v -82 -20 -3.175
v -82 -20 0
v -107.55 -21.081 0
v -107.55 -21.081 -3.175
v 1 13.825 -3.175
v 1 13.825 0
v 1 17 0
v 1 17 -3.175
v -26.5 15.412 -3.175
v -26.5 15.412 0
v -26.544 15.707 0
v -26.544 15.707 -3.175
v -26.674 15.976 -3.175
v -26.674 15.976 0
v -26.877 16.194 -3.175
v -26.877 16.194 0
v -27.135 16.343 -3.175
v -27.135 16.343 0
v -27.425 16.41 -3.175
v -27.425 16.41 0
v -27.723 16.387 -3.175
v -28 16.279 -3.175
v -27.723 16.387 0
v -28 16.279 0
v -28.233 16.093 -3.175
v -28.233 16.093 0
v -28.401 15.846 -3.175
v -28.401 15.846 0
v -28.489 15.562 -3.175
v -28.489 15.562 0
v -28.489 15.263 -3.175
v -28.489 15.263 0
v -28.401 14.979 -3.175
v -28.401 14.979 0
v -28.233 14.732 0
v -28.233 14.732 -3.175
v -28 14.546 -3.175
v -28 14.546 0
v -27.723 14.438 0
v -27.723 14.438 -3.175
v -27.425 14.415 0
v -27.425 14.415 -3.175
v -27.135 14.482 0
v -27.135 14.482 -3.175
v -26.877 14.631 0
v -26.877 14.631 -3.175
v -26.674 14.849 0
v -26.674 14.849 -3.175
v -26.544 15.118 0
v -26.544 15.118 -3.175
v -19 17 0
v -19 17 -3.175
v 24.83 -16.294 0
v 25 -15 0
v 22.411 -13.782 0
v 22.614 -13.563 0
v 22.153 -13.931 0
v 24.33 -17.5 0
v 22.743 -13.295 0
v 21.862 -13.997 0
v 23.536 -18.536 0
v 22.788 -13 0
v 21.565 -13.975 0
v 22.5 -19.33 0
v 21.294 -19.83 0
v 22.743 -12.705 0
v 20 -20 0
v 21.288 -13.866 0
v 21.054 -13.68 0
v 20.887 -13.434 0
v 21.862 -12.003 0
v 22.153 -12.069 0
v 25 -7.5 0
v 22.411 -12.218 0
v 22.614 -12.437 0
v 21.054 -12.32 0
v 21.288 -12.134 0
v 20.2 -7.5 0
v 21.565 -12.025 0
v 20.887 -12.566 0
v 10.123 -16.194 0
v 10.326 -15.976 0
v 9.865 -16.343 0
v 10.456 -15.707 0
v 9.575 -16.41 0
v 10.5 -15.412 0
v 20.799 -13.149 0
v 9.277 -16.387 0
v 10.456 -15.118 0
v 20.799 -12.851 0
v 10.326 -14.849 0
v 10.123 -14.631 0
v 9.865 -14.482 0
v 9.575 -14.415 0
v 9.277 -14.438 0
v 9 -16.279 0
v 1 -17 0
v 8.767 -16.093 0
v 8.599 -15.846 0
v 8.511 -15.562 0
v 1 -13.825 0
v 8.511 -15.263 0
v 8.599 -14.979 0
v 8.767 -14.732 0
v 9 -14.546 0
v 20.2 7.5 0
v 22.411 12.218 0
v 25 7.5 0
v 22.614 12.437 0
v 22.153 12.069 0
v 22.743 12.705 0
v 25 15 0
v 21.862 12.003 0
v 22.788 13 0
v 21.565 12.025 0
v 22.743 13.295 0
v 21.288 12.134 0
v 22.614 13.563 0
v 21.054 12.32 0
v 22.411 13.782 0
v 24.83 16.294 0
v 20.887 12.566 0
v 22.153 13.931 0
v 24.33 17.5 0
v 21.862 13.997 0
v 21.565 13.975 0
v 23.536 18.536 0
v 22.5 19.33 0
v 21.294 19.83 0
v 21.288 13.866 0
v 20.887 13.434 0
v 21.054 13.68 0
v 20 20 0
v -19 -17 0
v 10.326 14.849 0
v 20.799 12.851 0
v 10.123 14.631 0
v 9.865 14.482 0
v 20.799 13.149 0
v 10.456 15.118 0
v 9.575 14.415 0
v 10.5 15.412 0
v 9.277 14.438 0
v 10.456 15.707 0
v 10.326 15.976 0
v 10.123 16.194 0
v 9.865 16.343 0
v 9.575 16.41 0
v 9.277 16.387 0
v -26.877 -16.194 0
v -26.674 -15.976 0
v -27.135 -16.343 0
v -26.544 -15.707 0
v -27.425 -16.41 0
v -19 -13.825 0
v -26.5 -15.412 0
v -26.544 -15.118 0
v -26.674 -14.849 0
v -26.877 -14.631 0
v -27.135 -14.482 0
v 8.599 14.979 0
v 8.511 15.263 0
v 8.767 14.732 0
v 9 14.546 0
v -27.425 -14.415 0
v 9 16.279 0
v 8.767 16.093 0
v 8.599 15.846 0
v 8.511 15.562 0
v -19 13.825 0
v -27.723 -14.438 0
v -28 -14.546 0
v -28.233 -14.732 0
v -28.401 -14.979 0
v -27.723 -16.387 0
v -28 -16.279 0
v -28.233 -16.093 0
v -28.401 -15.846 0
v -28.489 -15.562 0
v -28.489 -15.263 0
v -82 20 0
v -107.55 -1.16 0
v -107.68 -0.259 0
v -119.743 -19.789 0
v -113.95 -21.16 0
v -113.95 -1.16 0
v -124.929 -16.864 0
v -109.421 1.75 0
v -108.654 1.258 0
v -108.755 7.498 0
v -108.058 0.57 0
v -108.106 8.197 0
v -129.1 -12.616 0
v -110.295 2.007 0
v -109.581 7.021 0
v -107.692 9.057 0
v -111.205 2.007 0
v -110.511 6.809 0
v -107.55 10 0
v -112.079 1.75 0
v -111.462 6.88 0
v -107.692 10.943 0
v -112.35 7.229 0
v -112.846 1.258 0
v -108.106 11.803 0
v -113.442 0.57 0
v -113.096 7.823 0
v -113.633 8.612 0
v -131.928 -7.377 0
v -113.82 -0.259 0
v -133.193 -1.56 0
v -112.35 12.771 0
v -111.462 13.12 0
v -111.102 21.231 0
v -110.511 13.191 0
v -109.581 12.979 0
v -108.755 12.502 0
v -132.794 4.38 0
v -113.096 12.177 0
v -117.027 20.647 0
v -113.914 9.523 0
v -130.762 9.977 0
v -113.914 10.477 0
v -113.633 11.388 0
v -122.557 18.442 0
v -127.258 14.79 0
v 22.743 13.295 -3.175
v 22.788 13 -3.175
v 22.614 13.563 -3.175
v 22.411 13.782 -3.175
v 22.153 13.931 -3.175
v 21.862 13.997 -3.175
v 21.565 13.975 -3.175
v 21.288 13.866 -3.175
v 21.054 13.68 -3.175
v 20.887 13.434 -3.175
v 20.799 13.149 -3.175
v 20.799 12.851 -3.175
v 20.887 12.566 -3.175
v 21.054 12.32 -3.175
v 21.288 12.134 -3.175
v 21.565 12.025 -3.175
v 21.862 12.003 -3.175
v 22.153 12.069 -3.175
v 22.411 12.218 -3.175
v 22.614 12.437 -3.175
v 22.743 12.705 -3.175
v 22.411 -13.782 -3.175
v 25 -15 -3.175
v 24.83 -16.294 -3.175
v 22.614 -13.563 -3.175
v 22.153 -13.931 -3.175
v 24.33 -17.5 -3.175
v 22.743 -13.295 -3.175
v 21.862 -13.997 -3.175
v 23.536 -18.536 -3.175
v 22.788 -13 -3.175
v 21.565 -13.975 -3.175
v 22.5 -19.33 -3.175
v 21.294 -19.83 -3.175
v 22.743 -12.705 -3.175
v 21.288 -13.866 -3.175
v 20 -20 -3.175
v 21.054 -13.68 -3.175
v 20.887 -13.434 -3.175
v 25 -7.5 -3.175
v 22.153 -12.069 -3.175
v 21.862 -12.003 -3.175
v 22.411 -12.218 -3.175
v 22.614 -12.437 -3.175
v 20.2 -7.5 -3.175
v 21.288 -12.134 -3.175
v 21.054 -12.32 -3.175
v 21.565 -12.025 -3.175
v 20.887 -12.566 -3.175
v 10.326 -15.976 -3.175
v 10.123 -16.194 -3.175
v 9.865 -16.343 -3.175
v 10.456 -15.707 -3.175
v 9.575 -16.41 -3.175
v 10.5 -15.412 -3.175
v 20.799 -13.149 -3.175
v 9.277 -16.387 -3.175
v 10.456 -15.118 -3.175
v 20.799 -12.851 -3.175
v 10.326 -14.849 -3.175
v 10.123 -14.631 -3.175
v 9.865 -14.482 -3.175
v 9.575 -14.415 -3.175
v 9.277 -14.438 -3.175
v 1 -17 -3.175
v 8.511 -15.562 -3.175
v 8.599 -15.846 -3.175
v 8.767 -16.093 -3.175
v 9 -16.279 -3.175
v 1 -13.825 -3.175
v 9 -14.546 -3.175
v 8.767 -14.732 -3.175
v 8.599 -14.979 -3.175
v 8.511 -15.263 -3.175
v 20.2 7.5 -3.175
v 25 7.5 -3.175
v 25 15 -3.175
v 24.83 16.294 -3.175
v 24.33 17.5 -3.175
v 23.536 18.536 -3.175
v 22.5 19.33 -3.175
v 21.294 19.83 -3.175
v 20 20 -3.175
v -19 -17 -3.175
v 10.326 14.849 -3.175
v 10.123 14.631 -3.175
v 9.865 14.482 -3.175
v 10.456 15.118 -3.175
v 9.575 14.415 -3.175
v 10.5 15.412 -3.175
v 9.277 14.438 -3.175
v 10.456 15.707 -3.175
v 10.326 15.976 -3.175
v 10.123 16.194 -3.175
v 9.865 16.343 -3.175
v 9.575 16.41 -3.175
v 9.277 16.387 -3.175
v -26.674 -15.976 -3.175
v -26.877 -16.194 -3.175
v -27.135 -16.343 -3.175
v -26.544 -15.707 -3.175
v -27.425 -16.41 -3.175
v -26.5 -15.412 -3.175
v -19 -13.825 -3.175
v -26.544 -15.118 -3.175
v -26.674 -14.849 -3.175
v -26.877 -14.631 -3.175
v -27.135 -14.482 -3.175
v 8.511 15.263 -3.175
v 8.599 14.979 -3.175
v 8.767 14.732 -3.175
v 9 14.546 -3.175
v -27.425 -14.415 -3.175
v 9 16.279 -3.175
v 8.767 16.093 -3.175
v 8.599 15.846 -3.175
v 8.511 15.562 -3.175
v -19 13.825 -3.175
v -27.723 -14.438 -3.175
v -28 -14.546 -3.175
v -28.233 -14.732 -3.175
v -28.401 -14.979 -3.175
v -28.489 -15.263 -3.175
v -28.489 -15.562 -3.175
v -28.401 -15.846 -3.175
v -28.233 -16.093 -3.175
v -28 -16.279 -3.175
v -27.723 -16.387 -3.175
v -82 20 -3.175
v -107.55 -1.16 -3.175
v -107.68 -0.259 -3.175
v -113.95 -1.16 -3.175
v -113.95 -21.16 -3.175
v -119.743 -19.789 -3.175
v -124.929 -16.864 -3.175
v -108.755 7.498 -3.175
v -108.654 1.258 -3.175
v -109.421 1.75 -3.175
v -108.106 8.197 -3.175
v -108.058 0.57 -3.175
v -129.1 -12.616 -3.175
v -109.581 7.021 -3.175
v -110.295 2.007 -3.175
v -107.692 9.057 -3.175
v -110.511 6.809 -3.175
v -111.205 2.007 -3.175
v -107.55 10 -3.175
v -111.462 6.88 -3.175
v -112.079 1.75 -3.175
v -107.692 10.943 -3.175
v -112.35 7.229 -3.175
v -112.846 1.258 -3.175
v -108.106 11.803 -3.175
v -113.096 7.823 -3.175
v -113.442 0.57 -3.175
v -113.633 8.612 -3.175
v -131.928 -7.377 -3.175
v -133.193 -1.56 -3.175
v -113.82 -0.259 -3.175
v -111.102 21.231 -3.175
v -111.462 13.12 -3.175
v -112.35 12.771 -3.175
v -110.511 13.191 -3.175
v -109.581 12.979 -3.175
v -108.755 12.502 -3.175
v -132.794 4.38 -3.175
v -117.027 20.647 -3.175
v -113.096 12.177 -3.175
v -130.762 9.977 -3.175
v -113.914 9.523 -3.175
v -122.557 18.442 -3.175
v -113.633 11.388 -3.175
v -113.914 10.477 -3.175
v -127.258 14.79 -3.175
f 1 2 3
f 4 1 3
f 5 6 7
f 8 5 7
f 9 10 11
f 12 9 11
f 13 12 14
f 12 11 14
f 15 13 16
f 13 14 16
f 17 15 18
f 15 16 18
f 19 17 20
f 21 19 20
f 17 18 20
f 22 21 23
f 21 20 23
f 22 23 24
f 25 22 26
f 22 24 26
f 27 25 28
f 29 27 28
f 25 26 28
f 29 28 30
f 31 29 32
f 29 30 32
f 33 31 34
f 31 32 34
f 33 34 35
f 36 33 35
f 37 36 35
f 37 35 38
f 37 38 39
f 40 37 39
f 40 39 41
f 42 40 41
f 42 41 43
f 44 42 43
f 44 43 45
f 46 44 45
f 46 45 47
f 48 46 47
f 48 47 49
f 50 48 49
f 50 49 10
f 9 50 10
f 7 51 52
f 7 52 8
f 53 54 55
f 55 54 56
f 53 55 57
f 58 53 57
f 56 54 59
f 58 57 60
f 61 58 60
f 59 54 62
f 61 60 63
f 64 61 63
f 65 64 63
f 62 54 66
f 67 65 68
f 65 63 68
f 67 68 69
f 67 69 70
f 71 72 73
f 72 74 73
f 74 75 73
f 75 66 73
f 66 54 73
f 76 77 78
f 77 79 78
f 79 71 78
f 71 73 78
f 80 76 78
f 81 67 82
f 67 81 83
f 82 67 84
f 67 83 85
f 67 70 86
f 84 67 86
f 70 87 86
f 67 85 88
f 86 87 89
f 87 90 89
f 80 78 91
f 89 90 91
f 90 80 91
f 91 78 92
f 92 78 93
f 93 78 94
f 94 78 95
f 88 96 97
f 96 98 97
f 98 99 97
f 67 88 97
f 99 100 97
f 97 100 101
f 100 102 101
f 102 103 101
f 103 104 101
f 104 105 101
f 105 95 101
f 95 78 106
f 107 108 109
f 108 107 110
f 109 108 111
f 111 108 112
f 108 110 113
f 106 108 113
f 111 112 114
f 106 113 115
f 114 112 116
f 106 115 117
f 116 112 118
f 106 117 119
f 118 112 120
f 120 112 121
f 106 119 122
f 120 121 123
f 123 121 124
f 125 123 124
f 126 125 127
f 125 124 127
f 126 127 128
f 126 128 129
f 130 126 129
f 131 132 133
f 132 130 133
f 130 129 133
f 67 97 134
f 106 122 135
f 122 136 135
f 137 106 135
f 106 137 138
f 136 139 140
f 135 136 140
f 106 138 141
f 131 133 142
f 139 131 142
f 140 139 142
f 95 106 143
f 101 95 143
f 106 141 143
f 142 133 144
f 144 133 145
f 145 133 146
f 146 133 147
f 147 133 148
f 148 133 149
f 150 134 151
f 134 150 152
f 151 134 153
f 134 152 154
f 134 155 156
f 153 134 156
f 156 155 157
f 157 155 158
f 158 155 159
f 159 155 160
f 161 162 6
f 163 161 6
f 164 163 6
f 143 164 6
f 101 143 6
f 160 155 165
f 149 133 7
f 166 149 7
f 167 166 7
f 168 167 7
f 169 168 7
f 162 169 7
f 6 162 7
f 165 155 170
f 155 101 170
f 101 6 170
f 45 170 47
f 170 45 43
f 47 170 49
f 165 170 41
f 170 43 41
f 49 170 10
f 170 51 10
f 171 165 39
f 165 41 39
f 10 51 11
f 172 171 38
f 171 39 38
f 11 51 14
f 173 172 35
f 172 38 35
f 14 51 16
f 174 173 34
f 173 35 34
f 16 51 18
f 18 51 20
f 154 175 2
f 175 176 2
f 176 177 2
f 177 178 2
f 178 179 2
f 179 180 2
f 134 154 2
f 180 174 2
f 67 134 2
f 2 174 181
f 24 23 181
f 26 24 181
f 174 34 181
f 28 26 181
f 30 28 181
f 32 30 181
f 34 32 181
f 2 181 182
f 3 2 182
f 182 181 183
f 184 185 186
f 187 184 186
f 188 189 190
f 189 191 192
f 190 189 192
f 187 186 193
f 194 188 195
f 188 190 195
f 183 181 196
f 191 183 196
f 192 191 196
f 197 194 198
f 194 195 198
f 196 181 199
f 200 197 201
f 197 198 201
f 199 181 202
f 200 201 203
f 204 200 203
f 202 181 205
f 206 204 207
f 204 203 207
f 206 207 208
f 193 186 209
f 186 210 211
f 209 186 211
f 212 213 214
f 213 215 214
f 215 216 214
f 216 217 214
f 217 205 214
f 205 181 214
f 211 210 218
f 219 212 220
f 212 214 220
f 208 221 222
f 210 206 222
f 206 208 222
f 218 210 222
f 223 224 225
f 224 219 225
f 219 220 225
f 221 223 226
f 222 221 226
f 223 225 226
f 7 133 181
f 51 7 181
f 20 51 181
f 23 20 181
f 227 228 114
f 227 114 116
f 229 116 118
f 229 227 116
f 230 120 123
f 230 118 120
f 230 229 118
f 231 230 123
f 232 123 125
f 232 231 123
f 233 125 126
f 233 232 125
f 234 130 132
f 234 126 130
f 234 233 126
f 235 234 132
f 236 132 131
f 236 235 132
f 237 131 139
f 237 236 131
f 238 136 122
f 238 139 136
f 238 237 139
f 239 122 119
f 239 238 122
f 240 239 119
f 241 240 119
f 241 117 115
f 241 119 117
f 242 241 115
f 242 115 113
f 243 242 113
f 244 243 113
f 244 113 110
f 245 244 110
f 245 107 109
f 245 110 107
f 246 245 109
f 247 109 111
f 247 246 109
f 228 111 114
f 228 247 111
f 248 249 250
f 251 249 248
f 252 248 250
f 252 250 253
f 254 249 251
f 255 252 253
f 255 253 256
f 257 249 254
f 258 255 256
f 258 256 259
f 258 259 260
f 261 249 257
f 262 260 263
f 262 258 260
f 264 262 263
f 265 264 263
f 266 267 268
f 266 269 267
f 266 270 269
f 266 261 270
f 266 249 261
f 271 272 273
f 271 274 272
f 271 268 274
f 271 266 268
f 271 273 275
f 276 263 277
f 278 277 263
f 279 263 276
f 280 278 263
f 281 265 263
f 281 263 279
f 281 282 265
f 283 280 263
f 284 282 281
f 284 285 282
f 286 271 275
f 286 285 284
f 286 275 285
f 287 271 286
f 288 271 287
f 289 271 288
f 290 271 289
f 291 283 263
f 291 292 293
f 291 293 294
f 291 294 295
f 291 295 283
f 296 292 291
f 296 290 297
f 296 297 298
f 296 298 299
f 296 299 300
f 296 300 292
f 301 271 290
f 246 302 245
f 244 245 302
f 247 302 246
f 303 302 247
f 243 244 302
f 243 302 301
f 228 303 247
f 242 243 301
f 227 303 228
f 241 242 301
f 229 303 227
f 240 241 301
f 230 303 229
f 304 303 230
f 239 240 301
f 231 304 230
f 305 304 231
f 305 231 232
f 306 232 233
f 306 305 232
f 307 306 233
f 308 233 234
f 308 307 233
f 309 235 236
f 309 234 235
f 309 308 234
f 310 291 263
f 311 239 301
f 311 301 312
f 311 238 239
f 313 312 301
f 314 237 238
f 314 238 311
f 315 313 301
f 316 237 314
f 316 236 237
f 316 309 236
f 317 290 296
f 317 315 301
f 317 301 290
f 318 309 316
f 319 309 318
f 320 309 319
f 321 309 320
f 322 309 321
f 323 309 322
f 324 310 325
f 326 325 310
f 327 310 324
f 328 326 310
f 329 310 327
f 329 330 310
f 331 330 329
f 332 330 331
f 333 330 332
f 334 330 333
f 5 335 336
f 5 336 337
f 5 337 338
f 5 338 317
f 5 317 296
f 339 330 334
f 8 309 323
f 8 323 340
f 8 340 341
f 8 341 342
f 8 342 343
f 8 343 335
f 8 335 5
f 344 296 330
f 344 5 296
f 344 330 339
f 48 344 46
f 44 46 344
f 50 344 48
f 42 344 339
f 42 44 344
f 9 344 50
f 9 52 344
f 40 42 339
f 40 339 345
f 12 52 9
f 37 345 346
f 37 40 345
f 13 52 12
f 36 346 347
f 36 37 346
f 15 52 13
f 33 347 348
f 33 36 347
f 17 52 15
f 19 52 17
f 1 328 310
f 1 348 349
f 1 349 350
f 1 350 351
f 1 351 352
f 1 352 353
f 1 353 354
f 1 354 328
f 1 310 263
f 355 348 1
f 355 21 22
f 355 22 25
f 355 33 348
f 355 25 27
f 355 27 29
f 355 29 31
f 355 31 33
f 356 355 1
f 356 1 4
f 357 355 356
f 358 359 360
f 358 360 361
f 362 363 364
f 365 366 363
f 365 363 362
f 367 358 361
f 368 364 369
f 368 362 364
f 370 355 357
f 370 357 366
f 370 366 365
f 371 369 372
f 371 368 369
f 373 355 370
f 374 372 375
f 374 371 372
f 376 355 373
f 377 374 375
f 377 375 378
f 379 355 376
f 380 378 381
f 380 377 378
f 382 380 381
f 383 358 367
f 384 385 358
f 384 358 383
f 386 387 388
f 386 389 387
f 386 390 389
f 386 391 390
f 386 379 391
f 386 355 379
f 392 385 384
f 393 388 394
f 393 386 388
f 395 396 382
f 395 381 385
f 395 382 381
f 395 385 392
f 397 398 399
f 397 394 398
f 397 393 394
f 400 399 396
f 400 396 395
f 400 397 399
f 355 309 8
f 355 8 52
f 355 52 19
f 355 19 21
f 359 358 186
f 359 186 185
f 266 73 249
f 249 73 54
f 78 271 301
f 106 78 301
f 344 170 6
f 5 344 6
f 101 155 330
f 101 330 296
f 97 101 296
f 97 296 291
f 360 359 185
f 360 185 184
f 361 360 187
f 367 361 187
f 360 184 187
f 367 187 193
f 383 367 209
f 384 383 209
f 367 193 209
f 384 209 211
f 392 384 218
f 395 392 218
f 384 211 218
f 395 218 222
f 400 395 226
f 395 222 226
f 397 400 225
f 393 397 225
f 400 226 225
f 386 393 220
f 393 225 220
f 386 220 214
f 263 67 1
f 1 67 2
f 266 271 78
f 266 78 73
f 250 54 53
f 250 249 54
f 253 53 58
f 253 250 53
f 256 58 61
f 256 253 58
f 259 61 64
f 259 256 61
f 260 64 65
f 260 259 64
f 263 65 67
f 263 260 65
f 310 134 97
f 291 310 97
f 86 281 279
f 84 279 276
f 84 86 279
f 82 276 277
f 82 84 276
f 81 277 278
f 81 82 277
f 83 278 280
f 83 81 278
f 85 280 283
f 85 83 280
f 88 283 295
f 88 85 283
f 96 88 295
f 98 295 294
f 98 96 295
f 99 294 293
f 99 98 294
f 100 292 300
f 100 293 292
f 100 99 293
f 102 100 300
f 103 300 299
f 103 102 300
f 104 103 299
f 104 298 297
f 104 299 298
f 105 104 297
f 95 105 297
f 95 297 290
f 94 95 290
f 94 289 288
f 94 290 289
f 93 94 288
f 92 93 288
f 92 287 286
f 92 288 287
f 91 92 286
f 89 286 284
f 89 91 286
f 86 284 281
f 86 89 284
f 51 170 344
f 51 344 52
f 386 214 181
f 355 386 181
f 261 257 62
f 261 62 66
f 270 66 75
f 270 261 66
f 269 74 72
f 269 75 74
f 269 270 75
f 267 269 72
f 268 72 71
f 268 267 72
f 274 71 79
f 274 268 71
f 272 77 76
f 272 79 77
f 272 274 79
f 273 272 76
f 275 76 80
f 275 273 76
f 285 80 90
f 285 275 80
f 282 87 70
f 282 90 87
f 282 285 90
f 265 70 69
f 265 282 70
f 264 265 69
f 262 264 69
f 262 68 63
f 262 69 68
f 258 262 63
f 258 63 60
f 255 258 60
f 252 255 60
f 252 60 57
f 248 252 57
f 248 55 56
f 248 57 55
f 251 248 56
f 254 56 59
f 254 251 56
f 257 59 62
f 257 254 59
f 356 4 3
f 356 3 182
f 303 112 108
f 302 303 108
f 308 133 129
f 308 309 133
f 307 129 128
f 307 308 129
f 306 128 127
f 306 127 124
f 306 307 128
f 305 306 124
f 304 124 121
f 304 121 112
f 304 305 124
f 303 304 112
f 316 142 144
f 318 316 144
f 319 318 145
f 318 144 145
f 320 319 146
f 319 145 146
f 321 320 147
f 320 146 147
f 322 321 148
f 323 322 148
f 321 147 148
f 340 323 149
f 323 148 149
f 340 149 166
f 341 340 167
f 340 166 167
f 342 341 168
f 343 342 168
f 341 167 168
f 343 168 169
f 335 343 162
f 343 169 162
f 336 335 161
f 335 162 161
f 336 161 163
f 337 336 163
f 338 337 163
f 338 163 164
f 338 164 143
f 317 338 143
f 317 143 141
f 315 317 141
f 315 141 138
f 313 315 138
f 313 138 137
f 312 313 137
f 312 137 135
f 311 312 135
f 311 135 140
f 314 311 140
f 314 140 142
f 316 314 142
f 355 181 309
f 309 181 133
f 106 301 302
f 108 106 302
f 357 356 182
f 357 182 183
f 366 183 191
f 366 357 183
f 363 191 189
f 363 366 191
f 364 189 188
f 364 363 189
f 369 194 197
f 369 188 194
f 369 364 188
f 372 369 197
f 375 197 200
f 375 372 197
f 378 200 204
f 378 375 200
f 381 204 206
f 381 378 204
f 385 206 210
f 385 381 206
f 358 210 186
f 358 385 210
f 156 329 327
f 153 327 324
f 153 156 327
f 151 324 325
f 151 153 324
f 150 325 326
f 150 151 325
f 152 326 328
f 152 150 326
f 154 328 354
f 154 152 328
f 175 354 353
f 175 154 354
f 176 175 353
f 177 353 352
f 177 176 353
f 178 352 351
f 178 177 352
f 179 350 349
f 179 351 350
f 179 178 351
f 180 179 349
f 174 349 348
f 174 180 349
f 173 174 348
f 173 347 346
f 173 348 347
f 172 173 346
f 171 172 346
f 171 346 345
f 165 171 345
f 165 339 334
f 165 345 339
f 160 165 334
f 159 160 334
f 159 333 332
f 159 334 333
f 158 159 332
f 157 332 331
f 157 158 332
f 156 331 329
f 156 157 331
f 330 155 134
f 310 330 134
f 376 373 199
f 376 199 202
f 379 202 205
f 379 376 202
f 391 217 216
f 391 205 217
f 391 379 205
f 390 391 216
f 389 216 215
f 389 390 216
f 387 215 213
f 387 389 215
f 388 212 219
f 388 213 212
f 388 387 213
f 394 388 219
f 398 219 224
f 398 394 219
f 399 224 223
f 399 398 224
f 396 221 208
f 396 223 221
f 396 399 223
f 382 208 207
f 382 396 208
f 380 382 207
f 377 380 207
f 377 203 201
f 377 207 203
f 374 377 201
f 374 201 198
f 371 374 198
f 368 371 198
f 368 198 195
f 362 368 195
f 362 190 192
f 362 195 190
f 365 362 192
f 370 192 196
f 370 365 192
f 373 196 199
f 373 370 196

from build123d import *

# Parameters (mm, degrees)
BOSS_EXTRUDE1_DEPTH     = 3.175
CUT_EXTRUDE1_DEPTH      = 135.971128857
CUT_EXTRUDE1_DEPTH_BACK = 135.971128857
SKETCH3_R               = 3.2
SKETCH6_R               = 1
SKETCH6_W               = 20
SKETCH6_H               = 3.175
CUT_EXTRUDE4_DEPTH      = 135.971128857
CUT_EXTRUDE5_DEPTH      = 135.971128857
CUT_EXTRUDE5_DEPTH_BACK = 135.971128857
SKETCH7_R               = 1
SKETCH7_W               = 4.8
SKETCH7_H               = 15
FILLET2_R               = 5
FILLET3_R               = 5
CUT_EXTRUDE6_DEPTH      = 135.971128857
CUT_EXTRUDE6_DEPTH_BACK = 135.971128857


with BuildPart() as part:
    # Sketch1 → Boss-Extrude1 (new body)
    with BuildSketch(Plane.XY):
        with BuildLine():
            Line((-111.101926123, 21.231014185), (-82, 20))
            Line((-82, 20), (25, 20))
            Line((25, 20), (25, -20))
            Line((25, -20), (-82, -20))
            Line((-82, -20), (-111.101926123, -21.231014185))
            ThreePointArc((-111.101926123, -21.231014185), (-133.25, 0), (-111.101926123, 21.231014185))
        make_face()
    extrude(amount=-BOSS_EXTRUDE1_DEPTH)

    # Sketch3 → Cut-Extrude1 (cut, two sides: drawn at the far end of the back side and taken through both)
    with BuildSketch(Plane.XY.offset(-CUT_EXTRUDE1_DEPTH_BACK)):
        with Locations((-110.75, 10)):
            Circle(SKETCH3_R)
    extrude(amount=CUT_EXTRUDE1_DEPTH + CUT_EXTRUDE1_DEPTH_BACK, mode=Mode.SUBTRACT)

    # Sketch6 → Cut-Extrude4 (cut, symmetric)
    with BuildSketch(Plane.XY):
        with Locations((9.5, 15.4125)):
            Circle(SKETCH6_R)
        with Locations((-27.5, 15.4125)):
            Circle(SKETCH6_R)
        with Locations((-9, 15.4125)):
            Rectangle(SKETCH6_W, SKETCH6_H)
    cut_extrude4 = extrude(amount=CUT_EXTRUDE4_DEPTH, both=True, mode=Mode.SUBTRACT)

    # Mirror1: Cut-Extrude4 across plane
    add(cut_extrude4.mirror(Plane.ZX), mode=Mode.SUBTRACT)

    # Sketch7 → Cut-Extrude5 (cut, two sides: drawn at the far end of the back side and taken through both)
    with BuildSketch(Plane.XY.offset(-CUT_EXTRUDE5_DEPTH_BACK)):
        with Locations((21.7875, 13)):
            Circle(SKETCH7_R)
        with Locations((21.7875, -13)):
            Circle(SKETCH7_R)
        with Locations((22.6, 0)):
            Rectangle(SKETCH7_W, SKETCH7_H)
    extrude(amount=CUT_EXTRUDE5_DEPTH + CUT_EXTRUDE5_DEPTH_BACK, mode=Mode.SUBTRACT)

    # Fillet2
    fillet2_edges = [part.edges().sort_by_distance(p)[0] for p in [
        (25, 20, -1.5875),
    ]]
    fillet(fillet2_edges, radius=FILLET2_R)

    # Fillet3
    fillet3_edges = [part.edges().sort_by_distance(p)[0] for p in [
        (25, -20, -1.5875),
    ]]
    fillet(fillet3_edges, radius=FILLET3_R)

    # Sketch8 → Cut-Extrude6 (cut, two sides: drawn at the far end of the back side and taken through both)
    with BuildSketch(Plane.XY.offset(-CUT_EXTRUDE6_DEPTH_BACK)):
        with BuildLine():
            Line((-107.55, -21.080767379), (-107.55, -1.160340262))
            ThreePointArc((-107.55, -1.160340262), (-110.75, 2.039659738), (-113.95, -1.160340262))
            Line((-113.95, -1.160340262), (-113.95, -21.160340262))
            ThreePointArc((-113.95, -21.160340262), (-112.527148786, -21.243460503), (-111.101926123, -21.231014185))
            Line((-111.101926123, -21.231014185), (-107.55, -21.080767379))
        make_face()
    extrude(amount=CUT_EXTRUDE6_DEPTH + CUT_EXTRUDE6_DEPTH_BACK, mode=Mode.SUBTRACT)


solid = part.part
